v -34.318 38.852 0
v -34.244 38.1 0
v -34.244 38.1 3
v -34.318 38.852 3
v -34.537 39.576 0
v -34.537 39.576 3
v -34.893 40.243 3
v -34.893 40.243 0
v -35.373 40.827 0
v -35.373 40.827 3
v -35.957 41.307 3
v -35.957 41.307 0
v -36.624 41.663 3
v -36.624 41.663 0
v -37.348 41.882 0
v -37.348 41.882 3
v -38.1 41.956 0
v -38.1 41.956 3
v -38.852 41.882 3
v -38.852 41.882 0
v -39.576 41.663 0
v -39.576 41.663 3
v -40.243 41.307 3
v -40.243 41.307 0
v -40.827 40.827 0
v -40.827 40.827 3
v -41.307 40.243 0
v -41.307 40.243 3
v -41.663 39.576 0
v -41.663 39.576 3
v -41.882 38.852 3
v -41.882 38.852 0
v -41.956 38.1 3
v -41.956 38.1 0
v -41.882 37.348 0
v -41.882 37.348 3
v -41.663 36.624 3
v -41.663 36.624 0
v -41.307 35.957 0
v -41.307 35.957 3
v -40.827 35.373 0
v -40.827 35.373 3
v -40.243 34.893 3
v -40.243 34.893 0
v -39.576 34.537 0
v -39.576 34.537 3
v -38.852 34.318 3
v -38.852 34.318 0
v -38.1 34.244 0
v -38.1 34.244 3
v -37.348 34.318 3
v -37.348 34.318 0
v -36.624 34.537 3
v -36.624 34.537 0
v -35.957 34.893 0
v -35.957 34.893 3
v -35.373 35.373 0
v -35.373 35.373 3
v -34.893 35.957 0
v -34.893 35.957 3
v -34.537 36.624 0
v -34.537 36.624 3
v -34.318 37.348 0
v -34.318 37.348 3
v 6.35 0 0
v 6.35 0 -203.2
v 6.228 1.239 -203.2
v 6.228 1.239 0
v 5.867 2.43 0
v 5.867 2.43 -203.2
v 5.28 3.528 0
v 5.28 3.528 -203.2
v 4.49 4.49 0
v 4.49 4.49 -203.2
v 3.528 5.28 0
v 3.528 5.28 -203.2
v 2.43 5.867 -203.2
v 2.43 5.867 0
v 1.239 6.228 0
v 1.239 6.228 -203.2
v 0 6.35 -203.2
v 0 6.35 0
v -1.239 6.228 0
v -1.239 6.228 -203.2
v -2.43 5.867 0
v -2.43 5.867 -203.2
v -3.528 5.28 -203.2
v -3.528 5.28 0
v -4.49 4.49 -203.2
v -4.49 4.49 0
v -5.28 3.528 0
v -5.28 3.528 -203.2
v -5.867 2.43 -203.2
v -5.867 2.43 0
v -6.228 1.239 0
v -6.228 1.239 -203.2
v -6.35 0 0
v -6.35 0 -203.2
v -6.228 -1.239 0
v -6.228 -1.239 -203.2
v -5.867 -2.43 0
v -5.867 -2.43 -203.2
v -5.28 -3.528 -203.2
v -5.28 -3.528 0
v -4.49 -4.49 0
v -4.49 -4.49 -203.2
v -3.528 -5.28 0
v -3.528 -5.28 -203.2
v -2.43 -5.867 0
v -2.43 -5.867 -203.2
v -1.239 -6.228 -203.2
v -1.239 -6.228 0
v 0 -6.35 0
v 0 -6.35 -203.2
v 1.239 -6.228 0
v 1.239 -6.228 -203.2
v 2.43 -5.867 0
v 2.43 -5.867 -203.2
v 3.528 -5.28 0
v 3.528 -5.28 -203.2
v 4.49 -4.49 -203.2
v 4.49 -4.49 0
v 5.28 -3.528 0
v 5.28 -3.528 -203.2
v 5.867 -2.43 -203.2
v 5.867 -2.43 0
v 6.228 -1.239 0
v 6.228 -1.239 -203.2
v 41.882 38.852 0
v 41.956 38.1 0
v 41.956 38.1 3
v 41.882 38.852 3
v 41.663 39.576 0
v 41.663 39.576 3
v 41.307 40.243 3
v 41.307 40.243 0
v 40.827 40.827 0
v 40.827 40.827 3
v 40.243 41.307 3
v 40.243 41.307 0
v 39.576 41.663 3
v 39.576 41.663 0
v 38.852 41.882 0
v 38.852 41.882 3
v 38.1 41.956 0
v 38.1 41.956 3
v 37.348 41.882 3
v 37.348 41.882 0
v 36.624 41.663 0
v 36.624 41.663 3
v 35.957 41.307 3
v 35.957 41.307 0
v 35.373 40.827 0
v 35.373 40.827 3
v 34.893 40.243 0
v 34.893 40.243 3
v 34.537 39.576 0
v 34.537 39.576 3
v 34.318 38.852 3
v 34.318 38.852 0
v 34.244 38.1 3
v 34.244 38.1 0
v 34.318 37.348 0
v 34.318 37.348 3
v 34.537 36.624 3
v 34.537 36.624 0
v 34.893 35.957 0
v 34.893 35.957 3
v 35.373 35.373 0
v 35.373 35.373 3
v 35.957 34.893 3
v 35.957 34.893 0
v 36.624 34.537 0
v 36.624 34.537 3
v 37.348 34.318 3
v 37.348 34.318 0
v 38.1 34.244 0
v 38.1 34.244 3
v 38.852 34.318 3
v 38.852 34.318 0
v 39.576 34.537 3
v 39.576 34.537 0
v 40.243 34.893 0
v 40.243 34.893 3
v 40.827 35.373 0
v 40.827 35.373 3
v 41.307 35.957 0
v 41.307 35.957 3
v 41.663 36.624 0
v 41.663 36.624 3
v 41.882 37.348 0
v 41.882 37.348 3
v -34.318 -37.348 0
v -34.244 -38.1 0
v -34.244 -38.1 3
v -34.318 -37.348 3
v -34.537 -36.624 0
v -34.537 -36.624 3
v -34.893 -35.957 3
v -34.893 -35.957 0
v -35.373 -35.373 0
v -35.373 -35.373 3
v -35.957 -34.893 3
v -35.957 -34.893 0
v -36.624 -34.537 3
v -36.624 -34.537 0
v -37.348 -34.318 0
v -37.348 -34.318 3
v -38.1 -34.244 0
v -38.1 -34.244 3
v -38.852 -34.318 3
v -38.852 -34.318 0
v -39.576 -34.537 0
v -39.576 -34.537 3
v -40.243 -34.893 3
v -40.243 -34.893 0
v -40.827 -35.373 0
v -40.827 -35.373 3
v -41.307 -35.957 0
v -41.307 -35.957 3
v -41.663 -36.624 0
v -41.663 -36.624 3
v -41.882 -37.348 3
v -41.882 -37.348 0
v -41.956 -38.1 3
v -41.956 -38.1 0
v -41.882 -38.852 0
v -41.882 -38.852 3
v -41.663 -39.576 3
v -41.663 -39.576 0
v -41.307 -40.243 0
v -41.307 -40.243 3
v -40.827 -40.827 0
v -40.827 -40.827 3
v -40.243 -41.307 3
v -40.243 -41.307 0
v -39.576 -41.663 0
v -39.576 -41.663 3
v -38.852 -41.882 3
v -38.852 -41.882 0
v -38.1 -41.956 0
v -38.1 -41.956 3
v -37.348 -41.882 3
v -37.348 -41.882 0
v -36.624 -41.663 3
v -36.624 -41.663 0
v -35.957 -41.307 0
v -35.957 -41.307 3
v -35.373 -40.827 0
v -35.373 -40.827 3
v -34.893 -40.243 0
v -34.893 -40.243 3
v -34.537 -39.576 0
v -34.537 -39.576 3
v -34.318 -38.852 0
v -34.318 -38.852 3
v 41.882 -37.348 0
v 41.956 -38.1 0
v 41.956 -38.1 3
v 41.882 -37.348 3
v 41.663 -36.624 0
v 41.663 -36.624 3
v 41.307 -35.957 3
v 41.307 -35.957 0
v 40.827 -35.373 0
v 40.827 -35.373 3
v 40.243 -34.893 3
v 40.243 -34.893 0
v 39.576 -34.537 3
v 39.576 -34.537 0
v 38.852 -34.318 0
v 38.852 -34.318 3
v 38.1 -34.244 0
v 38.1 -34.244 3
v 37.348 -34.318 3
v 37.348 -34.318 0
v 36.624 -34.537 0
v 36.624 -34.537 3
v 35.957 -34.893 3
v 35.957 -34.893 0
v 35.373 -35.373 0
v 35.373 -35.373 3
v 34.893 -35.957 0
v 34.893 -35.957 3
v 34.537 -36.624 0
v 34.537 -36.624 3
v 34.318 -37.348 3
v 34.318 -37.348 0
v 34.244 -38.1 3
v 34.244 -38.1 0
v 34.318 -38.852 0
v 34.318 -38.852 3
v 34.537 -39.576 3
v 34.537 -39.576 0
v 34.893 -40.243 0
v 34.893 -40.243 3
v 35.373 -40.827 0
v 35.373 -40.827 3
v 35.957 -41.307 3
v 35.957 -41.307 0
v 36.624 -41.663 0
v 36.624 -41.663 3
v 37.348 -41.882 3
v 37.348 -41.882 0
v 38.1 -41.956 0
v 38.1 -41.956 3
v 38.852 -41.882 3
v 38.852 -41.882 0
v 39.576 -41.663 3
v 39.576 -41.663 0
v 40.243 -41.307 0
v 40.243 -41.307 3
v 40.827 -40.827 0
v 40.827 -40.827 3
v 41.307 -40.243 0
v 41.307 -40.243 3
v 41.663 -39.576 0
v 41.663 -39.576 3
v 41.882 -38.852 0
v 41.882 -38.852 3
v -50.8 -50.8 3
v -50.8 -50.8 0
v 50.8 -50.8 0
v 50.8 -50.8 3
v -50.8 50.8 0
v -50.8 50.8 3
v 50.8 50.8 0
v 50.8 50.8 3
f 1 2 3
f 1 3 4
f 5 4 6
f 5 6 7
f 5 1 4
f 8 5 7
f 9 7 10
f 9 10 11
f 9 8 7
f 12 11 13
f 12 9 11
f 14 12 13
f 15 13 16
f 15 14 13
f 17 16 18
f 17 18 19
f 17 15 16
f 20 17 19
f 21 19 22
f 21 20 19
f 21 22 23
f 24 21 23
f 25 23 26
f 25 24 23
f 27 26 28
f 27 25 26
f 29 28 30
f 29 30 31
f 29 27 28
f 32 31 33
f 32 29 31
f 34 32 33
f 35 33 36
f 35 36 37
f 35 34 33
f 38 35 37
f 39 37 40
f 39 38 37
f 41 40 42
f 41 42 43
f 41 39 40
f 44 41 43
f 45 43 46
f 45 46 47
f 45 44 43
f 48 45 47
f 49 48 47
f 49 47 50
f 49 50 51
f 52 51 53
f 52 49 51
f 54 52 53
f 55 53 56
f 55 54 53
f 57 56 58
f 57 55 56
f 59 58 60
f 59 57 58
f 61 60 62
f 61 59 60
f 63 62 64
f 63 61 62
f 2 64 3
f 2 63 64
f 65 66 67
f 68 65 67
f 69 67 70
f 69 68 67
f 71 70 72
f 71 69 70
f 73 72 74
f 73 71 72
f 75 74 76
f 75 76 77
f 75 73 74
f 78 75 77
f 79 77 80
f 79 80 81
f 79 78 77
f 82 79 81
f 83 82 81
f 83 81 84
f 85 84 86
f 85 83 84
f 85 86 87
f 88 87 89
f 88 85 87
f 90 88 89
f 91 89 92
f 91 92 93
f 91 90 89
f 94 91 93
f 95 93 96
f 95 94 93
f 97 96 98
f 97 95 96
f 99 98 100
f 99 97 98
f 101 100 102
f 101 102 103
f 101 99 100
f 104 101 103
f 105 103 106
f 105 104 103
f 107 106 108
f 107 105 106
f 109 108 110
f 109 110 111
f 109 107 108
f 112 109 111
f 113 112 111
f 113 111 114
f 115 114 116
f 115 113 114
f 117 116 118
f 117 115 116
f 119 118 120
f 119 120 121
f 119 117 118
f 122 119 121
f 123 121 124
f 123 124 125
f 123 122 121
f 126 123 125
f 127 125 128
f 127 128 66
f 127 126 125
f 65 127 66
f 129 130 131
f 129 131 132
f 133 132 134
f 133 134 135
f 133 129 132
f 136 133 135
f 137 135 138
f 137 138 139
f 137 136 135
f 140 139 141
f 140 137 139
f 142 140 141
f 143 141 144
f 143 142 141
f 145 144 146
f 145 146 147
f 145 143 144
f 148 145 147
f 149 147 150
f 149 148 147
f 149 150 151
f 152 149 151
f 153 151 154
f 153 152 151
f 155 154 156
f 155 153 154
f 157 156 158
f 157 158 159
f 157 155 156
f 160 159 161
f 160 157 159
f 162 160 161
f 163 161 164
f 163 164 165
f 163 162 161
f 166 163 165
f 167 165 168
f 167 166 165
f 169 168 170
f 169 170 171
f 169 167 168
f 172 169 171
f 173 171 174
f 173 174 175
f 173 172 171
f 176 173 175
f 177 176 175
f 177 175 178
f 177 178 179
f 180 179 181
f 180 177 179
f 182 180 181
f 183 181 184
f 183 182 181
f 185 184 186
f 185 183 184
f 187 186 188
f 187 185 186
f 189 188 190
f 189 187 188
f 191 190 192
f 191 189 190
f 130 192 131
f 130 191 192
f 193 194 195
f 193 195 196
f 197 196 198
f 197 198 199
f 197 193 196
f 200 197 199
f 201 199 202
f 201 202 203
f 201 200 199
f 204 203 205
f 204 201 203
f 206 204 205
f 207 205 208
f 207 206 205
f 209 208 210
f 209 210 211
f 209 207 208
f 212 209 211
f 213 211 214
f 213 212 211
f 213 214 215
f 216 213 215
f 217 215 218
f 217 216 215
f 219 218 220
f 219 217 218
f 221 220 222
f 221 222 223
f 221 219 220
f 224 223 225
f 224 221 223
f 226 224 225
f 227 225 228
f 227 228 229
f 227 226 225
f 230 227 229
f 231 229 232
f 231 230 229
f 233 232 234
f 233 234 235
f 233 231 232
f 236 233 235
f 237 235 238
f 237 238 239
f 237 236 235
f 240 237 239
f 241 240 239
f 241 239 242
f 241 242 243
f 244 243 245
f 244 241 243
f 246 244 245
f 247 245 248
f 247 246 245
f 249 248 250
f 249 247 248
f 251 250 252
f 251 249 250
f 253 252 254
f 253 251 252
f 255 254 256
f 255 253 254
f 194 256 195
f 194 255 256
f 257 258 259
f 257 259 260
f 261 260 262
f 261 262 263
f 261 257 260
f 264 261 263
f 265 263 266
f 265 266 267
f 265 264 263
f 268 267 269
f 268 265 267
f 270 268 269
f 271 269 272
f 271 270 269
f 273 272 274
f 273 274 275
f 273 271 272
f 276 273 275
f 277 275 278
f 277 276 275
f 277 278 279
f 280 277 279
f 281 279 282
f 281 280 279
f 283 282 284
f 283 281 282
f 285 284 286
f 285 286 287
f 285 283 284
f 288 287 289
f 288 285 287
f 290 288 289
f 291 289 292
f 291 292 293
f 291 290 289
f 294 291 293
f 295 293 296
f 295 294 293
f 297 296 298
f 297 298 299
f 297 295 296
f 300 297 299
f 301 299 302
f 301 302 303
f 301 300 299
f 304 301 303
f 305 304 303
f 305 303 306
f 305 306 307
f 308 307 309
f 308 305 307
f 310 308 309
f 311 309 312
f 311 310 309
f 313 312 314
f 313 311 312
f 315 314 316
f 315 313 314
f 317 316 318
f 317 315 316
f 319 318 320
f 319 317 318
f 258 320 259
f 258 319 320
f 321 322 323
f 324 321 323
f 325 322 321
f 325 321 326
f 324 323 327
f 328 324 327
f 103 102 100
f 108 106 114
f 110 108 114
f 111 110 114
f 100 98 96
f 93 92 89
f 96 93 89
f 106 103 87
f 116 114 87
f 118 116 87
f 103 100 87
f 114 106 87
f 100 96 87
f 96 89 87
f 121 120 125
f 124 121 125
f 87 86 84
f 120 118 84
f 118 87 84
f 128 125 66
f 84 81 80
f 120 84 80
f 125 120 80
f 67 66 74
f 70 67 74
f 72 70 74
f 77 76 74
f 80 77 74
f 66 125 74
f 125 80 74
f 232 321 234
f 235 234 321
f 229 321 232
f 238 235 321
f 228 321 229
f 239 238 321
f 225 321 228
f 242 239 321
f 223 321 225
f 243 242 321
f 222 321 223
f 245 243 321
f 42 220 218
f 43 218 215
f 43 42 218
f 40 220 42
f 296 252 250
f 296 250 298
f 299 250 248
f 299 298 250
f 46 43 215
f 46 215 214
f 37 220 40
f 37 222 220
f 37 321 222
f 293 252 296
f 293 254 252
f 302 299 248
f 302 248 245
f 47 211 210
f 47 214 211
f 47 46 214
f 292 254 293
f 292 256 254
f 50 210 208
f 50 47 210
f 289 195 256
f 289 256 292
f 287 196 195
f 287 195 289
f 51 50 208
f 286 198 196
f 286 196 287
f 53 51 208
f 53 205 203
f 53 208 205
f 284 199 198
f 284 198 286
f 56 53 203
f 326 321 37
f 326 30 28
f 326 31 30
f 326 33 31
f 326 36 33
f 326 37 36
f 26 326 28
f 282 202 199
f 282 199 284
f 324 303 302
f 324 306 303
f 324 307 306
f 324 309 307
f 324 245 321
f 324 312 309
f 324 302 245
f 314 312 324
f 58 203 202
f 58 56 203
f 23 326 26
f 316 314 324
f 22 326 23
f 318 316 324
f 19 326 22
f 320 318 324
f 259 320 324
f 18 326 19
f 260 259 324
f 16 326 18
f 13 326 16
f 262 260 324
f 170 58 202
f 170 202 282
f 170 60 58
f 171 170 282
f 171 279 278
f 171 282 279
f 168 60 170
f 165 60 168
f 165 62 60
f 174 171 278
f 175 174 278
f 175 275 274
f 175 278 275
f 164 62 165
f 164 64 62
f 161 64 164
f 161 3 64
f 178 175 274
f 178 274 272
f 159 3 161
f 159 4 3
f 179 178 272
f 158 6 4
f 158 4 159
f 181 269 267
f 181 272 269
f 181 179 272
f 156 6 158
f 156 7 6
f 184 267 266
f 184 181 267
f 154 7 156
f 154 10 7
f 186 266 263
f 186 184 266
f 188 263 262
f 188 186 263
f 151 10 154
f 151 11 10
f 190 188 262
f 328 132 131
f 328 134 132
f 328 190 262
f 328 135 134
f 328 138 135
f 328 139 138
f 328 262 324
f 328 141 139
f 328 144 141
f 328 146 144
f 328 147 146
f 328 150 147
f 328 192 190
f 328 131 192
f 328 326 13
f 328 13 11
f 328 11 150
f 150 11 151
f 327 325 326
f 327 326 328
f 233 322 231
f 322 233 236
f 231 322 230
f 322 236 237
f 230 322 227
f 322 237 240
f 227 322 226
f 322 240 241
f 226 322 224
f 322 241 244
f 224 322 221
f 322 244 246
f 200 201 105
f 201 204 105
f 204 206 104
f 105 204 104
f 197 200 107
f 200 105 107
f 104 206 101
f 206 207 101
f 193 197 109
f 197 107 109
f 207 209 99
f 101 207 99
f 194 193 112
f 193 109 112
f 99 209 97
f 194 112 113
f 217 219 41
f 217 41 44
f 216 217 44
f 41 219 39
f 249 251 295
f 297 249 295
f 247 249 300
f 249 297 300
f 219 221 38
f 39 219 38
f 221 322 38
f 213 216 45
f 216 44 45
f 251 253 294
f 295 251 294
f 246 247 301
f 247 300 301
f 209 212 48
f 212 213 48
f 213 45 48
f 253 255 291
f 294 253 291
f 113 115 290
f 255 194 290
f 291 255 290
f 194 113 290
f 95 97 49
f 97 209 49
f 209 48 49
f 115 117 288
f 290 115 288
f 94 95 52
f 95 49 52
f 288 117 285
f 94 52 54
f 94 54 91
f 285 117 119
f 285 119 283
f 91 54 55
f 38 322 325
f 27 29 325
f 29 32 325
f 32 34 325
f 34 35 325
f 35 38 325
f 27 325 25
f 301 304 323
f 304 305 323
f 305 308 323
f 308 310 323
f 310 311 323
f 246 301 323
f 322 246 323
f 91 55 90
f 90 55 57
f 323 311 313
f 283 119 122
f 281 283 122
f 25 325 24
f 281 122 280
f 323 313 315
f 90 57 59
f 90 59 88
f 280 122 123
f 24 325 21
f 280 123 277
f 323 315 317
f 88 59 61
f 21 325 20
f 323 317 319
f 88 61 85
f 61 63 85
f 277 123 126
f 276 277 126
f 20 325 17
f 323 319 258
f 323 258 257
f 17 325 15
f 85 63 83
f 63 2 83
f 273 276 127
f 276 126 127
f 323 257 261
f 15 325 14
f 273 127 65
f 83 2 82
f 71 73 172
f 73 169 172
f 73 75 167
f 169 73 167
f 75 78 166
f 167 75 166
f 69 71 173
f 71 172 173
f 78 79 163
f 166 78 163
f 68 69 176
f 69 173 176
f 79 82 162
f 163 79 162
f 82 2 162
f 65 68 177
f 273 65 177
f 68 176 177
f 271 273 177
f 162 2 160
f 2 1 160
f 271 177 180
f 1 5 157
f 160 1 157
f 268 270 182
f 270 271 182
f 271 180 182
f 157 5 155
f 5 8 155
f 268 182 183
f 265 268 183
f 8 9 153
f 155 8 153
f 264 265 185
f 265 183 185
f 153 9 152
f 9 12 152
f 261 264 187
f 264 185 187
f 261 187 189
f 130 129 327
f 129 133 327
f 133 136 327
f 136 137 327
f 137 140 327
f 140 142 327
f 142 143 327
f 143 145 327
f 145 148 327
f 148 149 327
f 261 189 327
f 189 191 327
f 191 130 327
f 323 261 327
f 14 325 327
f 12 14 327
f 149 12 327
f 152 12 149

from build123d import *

# Parameters (mm, degrees)
SKETCH1_W           = 101.6
SKETCH1_H           = 101.6
SKETCH1_R           = 3.856433765
BOSS_EXTRUDE1_DEPTH = 3
SKETCH1_4_R         = 6.35
BOSS_EXTRUDE2_DEPTH = 203.2


with BuildPart() as part:
    # Sketch1 → Boss-Extrude1 (new body)
    with BuildSketch(Plane.XY):
        Rectangle(SKETCH1_W, SKETCH1_H)
        with Locations((-38.1, -38.1)):
            Circle(SKETCH1_R, mode=Mode.SUBTRACT)
        with Locations((38.1, -38.1)):
            Circle(SKETCH1_R, mode=Mode.SUBTRACT)
        with Locations((-38.1, 38.1)):
            Circle(SKETCH1_R, mode=Mode.SUBTRACT)
        with Locations((38.1, 38.1)):
            Circle(SKETCH1_R, mode=Mode.SUBTRACT)
    extrude(amount=BOSS_EXTRUDE1_DEPTH)

    # Sketch1<4> → Boss-Extrude2 (add)
    with BuildSketch(Plane.XY):
        Circle(SKETCH1_4_R)
    extrude(amount=-BOSS_EXTRUDE2_DEPTH)


solid = part.part
